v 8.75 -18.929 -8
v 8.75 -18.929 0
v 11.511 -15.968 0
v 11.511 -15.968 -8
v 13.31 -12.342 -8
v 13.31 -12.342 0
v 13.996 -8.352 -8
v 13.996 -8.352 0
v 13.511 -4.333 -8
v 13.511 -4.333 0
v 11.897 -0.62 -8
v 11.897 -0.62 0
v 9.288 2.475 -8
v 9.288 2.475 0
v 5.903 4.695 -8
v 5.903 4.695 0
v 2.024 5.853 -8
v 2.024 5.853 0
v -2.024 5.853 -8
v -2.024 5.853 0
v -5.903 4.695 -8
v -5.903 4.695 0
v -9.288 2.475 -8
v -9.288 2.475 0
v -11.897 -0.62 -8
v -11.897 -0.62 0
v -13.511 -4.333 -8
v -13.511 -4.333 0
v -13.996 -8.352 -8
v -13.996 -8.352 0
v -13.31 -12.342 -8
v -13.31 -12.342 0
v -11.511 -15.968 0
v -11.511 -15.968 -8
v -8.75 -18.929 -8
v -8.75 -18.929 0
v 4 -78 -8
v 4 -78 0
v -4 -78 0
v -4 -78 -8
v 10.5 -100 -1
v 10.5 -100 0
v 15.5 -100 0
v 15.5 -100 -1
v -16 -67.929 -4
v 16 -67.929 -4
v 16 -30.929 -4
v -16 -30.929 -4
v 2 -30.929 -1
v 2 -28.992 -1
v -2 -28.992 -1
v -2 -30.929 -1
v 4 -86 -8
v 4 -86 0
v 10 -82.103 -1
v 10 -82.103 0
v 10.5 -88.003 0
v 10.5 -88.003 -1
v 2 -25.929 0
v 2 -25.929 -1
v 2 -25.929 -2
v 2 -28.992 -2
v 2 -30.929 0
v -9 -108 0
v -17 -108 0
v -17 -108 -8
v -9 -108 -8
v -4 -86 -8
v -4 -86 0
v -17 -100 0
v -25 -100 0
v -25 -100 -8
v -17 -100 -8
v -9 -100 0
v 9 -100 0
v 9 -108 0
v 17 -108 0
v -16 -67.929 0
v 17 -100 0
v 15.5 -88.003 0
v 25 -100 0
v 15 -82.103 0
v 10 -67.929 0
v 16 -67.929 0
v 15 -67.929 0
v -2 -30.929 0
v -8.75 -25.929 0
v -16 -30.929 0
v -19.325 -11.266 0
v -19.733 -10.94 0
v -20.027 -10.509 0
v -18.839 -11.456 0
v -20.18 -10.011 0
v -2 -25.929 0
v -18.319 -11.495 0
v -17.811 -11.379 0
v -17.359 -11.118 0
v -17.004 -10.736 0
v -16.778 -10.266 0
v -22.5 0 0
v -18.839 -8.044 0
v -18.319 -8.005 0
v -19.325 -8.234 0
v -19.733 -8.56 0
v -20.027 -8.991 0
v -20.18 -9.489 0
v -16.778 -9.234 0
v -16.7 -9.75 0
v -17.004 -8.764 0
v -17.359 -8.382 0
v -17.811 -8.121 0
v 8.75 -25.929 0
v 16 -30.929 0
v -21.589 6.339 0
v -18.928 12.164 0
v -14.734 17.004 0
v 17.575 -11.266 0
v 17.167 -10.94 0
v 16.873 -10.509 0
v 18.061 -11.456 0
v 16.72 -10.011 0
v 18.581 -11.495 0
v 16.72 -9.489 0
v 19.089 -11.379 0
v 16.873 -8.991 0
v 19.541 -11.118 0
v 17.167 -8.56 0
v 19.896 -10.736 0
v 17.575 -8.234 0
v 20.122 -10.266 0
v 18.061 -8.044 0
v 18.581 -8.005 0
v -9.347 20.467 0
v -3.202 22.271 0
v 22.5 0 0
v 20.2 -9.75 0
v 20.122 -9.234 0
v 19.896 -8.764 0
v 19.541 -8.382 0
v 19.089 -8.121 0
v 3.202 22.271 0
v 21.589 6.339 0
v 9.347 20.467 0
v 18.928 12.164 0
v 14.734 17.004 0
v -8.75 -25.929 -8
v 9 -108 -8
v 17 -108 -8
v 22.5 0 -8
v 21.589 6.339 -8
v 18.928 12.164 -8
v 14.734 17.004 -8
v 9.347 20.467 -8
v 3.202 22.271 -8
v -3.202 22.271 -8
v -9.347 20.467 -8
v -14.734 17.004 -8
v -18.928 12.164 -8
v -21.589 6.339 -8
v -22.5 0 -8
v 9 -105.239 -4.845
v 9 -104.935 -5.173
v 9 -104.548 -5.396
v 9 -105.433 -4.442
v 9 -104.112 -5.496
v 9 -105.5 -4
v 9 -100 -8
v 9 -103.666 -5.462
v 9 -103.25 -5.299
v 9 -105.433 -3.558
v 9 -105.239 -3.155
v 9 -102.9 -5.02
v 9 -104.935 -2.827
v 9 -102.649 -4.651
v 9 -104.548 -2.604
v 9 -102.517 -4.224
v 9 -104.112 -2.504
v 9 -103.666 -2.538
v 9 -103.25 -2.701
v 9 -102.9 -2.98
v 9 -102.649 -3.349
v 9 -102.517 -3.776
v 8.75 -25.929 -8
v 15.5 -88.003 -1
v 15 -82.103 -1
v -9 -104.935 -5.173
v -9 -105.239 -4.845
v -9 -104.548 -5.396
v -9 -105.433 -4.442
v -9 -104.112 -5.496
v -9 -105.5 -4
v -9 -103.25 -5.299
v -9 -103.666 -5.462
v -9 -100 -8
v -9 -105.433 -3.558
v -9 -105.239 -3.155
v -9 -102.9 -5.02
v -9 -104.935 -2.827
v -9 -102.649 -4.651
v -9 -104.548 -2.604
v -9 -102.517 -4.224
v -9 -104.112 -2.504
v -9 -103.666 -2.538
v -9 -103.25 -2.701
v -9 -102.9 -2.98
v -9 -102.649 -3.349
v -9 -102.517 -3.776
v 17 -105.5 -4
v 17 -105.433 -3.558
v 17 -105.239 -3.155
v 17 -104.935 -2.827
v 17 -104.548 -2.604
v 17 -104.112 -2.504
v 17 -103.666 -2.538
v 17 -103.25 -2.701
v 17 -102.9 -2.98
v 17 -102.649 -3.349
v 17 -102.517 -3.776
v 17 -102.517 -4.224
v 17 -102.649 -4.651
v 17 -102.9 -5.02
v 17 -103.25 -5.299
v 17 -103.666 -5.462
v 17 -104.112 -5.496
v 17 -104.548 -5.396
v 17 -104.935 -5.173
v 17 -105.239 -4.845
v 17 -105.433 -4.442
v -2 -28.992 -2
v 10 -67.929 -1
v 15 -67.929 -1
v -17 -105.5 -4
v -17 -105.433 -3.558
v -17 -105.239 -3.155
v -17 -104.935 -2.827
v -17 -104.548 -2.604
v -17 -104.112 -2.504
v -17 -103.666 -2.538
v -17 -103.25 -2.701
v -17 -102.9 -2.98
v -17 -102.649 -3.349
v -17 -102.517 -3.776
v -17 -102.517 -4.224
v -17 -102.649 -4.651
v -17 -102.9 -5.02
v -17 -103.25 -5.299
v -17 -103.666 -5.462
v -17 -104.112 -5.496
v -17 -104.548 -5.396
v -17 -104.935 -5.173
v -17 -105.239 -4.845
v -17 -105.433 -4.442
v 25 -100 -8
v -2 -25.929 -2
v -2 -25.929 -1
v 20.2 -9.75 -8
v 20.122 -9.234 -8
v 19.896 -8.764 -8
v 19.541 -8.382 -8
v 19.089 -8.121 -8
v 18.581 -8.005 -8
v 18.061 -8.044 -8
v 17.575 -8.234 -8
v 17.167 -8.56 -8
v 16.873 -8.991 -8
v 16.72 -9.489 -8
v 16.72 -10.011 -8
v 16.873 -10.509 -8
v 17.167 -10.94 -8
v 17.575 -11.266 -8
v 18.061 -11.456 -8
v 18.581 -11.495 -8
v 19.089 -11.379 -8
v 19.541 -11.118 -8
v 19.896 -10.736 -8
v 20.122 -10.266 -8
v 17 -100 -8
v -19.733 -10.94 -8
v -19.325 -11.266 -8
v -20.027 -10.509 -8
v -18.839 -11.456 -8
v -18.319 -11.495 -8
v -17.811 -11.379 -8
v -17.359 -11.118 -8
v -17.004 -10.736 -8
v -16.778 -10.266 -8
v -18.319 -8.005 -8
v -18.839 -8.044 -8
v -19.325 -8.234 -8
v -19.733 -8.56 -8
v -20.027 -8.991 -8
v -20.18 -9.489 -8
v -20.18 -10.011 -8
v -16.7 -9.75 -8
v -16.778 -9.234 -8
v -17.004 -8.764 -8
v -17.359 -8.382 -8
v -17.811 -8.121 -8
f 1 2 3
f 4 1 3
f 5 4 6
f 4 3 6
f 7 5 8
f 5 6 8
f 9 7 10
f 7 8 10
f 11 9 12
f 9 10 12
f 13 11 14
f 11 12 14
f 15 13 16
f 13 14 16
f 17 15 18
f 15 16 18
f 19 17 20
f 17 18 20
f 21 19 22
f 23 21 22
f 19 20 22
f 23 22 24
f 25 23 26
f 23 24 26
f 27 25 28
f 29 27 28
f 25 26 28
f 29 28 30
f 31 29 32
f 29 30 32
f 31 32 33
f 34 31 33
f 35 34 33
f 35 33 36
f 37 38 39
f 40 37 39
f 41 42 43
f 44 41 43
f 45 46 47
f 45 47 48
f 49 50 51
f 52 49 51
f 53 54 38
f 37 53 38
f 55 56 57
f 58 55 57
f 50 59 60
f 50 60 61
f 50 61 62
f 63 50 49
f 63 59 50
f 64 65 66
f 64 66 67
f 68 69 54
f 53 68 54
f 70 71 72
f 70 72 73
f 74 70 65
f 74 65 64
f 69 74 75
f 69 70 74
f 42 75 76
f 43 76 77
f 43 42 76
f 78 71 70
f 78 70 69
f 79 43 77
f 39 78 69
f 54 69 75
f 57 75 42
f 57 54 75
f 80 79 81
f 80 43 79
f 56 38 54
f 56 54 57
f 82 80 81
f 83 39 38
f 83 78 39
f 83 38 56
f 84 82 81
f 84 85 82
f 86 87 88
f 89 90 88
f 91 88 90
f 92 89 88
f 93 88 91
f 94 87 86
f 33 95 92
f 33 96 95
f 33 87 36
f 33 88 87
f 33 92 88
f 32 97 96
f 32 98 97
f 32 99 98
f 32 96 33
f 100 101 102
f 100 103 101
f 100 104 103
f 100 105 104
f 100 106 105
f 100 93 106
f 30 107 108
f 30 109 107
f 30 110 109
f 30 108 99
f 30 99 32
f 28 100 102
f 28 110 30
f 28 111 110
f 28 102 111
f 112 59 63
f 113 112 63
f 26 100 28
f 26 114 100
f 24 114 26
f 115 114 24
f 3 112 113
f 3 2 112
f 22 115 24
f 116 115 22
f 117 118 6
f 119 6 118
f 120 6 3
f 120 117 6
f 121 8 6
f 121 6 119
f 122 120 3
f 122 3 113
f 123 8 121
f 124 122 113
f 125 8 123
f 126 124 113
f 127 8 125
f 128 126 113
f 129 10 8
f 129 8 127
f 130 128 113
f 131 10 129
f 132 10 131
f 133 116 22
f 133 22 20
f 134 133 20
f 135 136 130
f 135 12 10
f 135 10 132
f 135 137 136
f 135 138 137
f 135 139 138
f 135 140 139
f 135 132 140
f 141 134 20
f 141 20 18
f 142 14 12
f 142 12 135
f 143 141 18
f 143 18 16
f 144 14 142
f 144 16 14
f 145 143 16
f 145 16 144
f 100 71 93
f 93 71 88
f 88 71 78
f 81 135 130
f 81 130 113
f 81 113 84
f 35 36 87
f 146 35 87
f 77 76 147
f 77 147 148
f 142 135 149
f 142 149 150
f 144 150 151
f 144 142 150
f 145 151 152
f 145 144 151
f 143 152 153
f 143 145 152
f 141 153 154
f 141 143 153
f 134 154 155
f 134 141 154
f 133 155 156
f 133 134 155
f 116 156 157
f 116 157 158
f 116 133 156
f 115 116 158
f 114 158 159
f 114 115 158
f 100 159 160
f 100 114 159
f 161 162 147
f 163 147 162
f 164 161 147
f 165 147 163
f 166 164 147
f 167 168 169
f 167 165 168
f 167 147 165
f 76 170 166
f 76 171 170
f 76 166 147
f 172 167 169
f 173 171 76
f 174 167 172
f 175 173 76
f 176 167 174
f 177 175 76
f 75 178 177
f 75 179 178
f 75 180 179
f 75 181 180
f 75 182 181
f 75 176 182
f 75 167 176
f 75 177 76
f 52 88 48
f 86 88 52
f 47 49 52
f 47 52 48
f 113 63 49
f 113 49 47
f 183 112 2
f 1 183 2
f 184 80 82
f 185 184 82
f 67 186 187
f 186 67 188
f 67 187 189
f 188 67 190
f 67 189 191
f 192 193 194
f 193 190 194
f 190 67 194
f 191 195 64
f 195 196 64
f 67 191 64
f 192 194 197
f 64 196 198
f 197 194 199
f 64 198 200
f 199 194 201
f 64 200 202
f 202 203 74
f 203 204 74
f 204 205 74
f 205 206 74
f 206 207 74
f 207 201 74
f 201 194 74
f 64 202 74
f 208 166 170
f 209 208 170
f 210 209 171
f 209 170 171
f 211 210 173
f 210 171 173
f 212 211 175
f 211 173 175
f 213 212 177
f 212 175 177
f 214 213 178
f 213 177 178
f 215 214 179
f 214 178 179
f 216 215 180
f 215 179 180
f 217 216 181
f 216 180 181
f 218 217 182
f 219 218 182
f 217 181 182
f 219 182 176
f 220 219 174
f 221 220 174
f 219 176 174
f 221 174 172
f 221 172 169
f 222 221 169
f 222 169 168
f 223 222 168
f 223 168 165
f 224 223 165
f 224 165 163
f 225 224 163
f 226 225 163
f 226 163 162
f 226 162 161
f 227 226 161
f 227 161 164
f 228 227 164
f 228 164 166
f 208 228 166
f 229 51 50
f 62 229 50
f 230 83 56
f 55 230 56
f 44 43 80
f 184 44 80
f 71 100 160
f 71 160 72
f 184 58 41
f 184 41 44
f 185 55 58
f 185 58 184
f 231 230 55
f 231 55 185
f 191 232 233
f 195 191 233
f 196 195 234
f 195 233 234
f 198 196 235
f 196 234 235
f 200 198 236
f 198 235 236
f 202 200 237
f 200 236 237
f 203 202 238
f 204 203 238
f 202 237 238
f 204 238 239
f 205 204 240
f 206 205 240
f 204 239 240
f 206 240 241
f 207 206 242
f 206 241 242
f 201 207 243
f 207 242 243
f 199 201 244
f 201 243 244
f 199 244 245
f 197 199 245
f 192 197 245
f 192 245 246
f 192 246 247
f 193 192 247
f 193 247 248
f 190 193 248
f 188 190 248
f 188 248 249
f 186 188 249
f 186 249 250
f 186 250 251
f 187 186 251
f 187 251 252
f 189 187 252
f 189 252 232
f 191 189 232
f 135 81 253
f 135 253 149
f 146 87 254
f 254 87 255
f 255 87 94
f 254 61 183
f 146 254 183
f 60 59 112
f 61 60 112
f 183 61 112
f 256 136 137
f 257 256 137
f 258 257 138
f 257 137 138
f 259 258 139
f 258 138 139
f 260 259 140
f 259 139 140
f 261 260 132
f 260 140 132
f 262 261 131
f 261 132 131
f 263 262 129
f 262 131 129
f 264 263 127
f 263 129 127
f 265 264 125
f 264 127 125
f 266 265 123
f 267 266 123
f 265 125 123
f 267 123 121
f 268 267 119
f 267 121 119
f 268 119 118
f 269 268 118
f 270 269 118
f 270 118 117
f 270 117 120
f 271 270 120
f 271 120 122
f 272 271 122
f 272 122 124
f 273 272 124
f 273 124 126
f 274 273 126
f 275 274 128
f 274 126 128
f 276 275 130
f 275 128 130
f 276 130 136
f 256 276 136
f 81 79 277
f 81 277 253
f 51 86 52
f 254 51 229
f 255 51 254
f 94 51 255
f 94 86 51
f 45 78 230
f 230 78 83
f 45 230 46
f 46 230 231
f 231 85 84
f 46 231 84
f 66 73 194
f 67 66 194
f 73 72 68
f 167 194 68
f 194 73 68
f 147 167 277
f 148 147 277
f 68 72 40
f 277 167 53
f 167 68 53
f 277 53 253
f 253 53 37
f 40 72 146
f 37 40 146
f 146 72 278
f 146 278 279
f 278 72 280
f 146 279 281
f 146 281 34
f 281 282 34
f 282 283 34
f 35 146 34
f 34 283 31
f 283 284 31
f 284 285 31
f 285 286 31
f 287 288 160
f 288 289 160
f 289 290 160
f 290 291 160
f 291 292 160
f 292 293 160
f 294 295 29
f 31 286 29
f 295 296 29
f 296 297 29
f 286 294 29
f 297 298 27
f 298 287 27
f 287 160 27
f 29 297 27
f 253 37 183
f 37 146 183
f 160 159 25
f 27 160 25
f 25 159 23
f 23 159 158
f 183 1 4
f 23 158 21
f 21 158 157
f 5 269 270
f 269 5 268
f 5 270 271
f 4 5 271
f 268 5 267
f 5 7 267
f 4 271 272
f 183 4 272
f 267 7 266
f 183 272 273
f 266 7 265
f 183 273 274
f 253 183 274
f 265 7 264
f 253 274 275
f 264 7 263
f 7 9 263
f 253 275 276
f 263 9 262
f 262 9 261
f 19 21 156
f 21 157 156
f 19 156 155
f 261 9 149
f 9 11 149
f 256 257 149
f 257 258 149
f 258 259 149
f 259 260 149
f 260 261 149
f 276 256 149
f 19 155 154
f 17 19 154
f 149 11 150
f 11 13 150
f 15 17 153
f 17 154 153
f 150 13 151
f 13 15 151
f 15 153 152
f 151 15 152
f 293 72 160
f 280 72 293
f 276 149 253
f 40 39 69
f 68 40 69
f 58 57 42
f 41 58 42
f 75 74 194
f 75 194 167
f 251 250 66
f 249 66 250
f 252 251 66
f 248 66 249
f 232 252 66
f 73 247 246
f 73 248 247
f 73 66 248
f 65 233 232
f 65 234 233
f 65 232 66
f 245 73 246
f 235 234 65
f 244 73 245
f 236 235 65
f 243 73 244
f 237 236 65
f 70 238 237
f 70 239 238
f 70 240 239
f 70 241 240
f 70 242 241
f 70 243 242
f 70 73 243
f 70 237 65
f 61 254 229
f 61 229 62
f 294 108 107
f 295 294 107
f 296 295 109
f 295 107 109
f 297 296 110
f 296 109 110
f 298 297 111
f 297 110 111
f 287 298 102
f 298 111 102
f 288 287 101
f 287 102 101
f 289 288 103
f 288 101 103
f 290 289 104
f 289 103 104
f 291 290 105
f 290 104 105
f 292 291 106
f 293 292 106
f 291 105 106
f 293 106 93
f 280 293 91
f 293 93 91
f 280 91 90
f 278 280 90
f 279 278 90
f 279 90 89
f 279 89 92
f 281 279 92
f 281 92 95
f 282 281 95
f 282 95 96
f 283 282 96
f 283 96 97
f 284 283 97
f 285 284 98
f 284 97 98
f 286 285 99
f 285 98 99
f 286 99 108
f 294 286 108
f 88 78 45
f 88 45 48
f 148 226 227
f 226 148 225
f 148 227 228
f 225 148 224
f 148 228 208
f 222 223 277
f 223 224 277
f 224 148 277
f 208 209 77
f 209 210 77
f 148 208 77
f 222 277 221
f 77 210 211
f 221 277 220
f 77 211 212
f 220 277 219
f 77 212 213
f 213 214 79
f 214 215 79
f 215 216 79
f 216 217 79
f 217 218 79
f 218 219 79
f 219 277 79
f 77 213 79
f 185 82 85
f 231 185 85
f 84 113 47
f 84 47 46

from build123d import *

# Parameters (mm, degrees)
ARM_BOSS_EXTRUDE1_DEPTH                    = 8
STEPPER_CUT_EXTRUDE1_DEPTH                 = 8
CABLE_CUT_EXTRUDE2_DEPTH                   = 1
ULN2003_MODULE_CUT_EXTRUDE3_DEPTH          = 4
SKETCH6_W                                  = 8
SKETCH6_H                                  = 8
PUZZLE_SLOT_BOSS_EXTRUDE2_DEPTH            = 8
SKETCH7_R                                  = 1.75
MOUNTING_HOLES_CUT_EXTRUDE4_DEPTH          = 8
PUZZLE_SLOT_SCREW_HOLES_CUT_EXTRUDE5_REACH = 118.155
SKETCH8_R                                  = 1.5
SKETCH10_W                                 = 4
SKETCH10_H                                 = 3.063353071
CABLE_OUTPUT_CUT_EXTRUDE6_DEPTH            = 1
SIDE_PUZZLE_SLOT_CUT_EXTRUDE7_DEPTH        = 8
CABLE_LOWER_CUT_EXTRUDE8_DEPTH             = 1


with BuildPart() as part:
    # Sketch2 → Arm Boss-Extrude1 (new body)
    with BuildSketch(Plane.XY):
        with BuildLine():
            Line((-22.5, 0), (-25, -100))
            Line((-25, -100), (0, -100))
            Line((0, -100), (25, -100))
            Line((25, -100), (22.5, 0))
            ThreePointArc((22.5, 0), (0, 22.5), (-22.5, 0))
        make_face()
    extrude(amount=-ARM_BOSS_EXTRUDE1_DEPTH)

    # Sketch3 → Stepper Cut-Extrude1 (cut)
    with BuildSketch(Plane.XY):
        with BuildLine():
            Line((-8.75, -18.928746497), (-8.75, -25.928746497))
            Line((-8.75, -25.928746497), (0, -25.928746497))
            Line((0, -25.928746497), (8.75, -25.928746497))
            Line((8.75, -25.928746497), (8.75, -18.928746497))
            ThreePointArc((8.75, -18.928746497), (0, 6), (-8.75, -18.928746497))
        make_face()
    extrude(amount=-STEPPER_CUT_EXTRUDE1_DEPTH, mode=Mode.SUBTRACT)

    # Sketch4 → Cable Cut-Extrude2 (cut)
    with BuildSketch(Plane.XY):
        Polygon((-2, -25.928746497), (2, -25.928746497), (2, -30.928746497), (0, -30.928746497), (-2, -30.928746497), align=None)
    extrude(amount=-CABLE_CUT_EXTRUDE2_DEPTH, mode=Mode.SUBTRACT)

    # Sketch5 → ULN2003 Module Cut-Extrude3 (cut)
    with BuildSketch(Plane.XY):
        Polygon((-16, -30.928746497), (16, -30.928746497), (16, -67.928746497), (0, -67.928746497), (-16, -67.928746497), align=None)
    extrude(amount=-ULN2003_MODULE_CUT_EXTRUDE3_DEPTH, mode=Mode.SUBTRACT)

    # Sketch6 → Puzzle Slot Boss-Extrude2 (add)
    with BuildSketch(Plane.XZ.offset(100)):
        with Locations((-13, -4)):
            Rectangle(SKETCH6_W, SKETCH6_H)
        with Locations((13, -4)):
            Rectangle(SKETCH6_W, SKETCH6_H)
    extrude(amount=PUZZLE_SLOT_BOSS_EXTRUDE2_DEPTH)

    # Sketch7 → Mounting Holes Cut-Extrude4 (cut)
    with BuildSketch(Plane.XY):
        with Locations((-18.45, -9.75)):
            Circle(SKETCH7_R)
        with Locations((18.45, -9.75)):
            Circle(SKETCH7_R)
    extrude(amount=-MOUNTING_HOLES_CUT_EXTRUDE4_DEPTH, mode=Mode.SUBTRACT)

    # Puzzle Slot Screw Holes Cut-Extrude5: up to this face of the body (flat: up to its plane)
    puzzle_slot_screw_holes_cut_extrude5_end = Plane(part.part.faces().sort_by_distance((17, -104, -4))[0])
    # Sketch8 → Puzzle Slot Screw Holes Cut-Extrude5 (cut, up to the picked face)
    with BuildSketch(Plane.ZY.offset(17), mode=Mode.PRIVATE) as puzzle_slot_screw_holes_cut_extrude5_sk1:
        with Locations(Location((-4, -104, 0), (0, 0, 270))):
            Circle(SKETCH8_R)
    puzzle_slot_screw_holes_cut_extrude5_tool1 = split(extrude(puzzle_slot_screw_holes_cut_extrude5_sk1.sketch, amount=-PUZZLE_SLOT_SCREW_HOLES_CUT_EXTRUDE5_REACH, mode=Mode.PRIVATE), bisect_by=puzzle_slot_screw_holes_cut_extrude5_end, keep=Keep.BOTH, mode=Mode.PRIVATE)
    add(puzzle_slot_screw_holes_cut_extrude5_tool1.solids().sort_by(Axis((-17, -104, -4), (1, 0, 0)))[0], mode=Mode.SUBTRACT)

    # Sketch10 → Cable Output Cut-Extrude6 (cut)
    with BuildSketch(Plane.XY.offset(-1)):
        with Locations((0, -27.460423033)):
            Rectangle(SKETCH10_W, SKETCH10_H)
    extrude(amount=-CABLE_OUTPUT_CUT_EXTRUDE6_DEPTH, mode=Mode.SUBTRACT)

    # Sketch11 → Side Puzzle Slot Cut-Extrude7 (cut)
    with BuildSketch(Plane.XY):
        Polygon((-4, -86), (4, -86), (4, -78), (0, -78), (-4, -78), align=None)
    extrude(amount=-SIDE_PUZZLE_SLOT_CUT_EXTRUDE7_DEPTH, mode=Mode.SUBTRACT)

    # Sketch12 → Cable Lower Cut-Extrude8 (cut)
    with BuildSketch(Plane.XY):
        Polygon((15, -67.928746497), (10, -67.928746497), (10, -82.103104923), (10.5, -88.003309516), (10.5, -100), (15.5, -100), (15.5, -88.003309516), (15, -82.103104923), align=None)
    extrude(amount=-CABLE_LOWER_CUT_EXTRUDE8_DEPTH, mode=Mode.SUBTRACT)


solid = part.part
